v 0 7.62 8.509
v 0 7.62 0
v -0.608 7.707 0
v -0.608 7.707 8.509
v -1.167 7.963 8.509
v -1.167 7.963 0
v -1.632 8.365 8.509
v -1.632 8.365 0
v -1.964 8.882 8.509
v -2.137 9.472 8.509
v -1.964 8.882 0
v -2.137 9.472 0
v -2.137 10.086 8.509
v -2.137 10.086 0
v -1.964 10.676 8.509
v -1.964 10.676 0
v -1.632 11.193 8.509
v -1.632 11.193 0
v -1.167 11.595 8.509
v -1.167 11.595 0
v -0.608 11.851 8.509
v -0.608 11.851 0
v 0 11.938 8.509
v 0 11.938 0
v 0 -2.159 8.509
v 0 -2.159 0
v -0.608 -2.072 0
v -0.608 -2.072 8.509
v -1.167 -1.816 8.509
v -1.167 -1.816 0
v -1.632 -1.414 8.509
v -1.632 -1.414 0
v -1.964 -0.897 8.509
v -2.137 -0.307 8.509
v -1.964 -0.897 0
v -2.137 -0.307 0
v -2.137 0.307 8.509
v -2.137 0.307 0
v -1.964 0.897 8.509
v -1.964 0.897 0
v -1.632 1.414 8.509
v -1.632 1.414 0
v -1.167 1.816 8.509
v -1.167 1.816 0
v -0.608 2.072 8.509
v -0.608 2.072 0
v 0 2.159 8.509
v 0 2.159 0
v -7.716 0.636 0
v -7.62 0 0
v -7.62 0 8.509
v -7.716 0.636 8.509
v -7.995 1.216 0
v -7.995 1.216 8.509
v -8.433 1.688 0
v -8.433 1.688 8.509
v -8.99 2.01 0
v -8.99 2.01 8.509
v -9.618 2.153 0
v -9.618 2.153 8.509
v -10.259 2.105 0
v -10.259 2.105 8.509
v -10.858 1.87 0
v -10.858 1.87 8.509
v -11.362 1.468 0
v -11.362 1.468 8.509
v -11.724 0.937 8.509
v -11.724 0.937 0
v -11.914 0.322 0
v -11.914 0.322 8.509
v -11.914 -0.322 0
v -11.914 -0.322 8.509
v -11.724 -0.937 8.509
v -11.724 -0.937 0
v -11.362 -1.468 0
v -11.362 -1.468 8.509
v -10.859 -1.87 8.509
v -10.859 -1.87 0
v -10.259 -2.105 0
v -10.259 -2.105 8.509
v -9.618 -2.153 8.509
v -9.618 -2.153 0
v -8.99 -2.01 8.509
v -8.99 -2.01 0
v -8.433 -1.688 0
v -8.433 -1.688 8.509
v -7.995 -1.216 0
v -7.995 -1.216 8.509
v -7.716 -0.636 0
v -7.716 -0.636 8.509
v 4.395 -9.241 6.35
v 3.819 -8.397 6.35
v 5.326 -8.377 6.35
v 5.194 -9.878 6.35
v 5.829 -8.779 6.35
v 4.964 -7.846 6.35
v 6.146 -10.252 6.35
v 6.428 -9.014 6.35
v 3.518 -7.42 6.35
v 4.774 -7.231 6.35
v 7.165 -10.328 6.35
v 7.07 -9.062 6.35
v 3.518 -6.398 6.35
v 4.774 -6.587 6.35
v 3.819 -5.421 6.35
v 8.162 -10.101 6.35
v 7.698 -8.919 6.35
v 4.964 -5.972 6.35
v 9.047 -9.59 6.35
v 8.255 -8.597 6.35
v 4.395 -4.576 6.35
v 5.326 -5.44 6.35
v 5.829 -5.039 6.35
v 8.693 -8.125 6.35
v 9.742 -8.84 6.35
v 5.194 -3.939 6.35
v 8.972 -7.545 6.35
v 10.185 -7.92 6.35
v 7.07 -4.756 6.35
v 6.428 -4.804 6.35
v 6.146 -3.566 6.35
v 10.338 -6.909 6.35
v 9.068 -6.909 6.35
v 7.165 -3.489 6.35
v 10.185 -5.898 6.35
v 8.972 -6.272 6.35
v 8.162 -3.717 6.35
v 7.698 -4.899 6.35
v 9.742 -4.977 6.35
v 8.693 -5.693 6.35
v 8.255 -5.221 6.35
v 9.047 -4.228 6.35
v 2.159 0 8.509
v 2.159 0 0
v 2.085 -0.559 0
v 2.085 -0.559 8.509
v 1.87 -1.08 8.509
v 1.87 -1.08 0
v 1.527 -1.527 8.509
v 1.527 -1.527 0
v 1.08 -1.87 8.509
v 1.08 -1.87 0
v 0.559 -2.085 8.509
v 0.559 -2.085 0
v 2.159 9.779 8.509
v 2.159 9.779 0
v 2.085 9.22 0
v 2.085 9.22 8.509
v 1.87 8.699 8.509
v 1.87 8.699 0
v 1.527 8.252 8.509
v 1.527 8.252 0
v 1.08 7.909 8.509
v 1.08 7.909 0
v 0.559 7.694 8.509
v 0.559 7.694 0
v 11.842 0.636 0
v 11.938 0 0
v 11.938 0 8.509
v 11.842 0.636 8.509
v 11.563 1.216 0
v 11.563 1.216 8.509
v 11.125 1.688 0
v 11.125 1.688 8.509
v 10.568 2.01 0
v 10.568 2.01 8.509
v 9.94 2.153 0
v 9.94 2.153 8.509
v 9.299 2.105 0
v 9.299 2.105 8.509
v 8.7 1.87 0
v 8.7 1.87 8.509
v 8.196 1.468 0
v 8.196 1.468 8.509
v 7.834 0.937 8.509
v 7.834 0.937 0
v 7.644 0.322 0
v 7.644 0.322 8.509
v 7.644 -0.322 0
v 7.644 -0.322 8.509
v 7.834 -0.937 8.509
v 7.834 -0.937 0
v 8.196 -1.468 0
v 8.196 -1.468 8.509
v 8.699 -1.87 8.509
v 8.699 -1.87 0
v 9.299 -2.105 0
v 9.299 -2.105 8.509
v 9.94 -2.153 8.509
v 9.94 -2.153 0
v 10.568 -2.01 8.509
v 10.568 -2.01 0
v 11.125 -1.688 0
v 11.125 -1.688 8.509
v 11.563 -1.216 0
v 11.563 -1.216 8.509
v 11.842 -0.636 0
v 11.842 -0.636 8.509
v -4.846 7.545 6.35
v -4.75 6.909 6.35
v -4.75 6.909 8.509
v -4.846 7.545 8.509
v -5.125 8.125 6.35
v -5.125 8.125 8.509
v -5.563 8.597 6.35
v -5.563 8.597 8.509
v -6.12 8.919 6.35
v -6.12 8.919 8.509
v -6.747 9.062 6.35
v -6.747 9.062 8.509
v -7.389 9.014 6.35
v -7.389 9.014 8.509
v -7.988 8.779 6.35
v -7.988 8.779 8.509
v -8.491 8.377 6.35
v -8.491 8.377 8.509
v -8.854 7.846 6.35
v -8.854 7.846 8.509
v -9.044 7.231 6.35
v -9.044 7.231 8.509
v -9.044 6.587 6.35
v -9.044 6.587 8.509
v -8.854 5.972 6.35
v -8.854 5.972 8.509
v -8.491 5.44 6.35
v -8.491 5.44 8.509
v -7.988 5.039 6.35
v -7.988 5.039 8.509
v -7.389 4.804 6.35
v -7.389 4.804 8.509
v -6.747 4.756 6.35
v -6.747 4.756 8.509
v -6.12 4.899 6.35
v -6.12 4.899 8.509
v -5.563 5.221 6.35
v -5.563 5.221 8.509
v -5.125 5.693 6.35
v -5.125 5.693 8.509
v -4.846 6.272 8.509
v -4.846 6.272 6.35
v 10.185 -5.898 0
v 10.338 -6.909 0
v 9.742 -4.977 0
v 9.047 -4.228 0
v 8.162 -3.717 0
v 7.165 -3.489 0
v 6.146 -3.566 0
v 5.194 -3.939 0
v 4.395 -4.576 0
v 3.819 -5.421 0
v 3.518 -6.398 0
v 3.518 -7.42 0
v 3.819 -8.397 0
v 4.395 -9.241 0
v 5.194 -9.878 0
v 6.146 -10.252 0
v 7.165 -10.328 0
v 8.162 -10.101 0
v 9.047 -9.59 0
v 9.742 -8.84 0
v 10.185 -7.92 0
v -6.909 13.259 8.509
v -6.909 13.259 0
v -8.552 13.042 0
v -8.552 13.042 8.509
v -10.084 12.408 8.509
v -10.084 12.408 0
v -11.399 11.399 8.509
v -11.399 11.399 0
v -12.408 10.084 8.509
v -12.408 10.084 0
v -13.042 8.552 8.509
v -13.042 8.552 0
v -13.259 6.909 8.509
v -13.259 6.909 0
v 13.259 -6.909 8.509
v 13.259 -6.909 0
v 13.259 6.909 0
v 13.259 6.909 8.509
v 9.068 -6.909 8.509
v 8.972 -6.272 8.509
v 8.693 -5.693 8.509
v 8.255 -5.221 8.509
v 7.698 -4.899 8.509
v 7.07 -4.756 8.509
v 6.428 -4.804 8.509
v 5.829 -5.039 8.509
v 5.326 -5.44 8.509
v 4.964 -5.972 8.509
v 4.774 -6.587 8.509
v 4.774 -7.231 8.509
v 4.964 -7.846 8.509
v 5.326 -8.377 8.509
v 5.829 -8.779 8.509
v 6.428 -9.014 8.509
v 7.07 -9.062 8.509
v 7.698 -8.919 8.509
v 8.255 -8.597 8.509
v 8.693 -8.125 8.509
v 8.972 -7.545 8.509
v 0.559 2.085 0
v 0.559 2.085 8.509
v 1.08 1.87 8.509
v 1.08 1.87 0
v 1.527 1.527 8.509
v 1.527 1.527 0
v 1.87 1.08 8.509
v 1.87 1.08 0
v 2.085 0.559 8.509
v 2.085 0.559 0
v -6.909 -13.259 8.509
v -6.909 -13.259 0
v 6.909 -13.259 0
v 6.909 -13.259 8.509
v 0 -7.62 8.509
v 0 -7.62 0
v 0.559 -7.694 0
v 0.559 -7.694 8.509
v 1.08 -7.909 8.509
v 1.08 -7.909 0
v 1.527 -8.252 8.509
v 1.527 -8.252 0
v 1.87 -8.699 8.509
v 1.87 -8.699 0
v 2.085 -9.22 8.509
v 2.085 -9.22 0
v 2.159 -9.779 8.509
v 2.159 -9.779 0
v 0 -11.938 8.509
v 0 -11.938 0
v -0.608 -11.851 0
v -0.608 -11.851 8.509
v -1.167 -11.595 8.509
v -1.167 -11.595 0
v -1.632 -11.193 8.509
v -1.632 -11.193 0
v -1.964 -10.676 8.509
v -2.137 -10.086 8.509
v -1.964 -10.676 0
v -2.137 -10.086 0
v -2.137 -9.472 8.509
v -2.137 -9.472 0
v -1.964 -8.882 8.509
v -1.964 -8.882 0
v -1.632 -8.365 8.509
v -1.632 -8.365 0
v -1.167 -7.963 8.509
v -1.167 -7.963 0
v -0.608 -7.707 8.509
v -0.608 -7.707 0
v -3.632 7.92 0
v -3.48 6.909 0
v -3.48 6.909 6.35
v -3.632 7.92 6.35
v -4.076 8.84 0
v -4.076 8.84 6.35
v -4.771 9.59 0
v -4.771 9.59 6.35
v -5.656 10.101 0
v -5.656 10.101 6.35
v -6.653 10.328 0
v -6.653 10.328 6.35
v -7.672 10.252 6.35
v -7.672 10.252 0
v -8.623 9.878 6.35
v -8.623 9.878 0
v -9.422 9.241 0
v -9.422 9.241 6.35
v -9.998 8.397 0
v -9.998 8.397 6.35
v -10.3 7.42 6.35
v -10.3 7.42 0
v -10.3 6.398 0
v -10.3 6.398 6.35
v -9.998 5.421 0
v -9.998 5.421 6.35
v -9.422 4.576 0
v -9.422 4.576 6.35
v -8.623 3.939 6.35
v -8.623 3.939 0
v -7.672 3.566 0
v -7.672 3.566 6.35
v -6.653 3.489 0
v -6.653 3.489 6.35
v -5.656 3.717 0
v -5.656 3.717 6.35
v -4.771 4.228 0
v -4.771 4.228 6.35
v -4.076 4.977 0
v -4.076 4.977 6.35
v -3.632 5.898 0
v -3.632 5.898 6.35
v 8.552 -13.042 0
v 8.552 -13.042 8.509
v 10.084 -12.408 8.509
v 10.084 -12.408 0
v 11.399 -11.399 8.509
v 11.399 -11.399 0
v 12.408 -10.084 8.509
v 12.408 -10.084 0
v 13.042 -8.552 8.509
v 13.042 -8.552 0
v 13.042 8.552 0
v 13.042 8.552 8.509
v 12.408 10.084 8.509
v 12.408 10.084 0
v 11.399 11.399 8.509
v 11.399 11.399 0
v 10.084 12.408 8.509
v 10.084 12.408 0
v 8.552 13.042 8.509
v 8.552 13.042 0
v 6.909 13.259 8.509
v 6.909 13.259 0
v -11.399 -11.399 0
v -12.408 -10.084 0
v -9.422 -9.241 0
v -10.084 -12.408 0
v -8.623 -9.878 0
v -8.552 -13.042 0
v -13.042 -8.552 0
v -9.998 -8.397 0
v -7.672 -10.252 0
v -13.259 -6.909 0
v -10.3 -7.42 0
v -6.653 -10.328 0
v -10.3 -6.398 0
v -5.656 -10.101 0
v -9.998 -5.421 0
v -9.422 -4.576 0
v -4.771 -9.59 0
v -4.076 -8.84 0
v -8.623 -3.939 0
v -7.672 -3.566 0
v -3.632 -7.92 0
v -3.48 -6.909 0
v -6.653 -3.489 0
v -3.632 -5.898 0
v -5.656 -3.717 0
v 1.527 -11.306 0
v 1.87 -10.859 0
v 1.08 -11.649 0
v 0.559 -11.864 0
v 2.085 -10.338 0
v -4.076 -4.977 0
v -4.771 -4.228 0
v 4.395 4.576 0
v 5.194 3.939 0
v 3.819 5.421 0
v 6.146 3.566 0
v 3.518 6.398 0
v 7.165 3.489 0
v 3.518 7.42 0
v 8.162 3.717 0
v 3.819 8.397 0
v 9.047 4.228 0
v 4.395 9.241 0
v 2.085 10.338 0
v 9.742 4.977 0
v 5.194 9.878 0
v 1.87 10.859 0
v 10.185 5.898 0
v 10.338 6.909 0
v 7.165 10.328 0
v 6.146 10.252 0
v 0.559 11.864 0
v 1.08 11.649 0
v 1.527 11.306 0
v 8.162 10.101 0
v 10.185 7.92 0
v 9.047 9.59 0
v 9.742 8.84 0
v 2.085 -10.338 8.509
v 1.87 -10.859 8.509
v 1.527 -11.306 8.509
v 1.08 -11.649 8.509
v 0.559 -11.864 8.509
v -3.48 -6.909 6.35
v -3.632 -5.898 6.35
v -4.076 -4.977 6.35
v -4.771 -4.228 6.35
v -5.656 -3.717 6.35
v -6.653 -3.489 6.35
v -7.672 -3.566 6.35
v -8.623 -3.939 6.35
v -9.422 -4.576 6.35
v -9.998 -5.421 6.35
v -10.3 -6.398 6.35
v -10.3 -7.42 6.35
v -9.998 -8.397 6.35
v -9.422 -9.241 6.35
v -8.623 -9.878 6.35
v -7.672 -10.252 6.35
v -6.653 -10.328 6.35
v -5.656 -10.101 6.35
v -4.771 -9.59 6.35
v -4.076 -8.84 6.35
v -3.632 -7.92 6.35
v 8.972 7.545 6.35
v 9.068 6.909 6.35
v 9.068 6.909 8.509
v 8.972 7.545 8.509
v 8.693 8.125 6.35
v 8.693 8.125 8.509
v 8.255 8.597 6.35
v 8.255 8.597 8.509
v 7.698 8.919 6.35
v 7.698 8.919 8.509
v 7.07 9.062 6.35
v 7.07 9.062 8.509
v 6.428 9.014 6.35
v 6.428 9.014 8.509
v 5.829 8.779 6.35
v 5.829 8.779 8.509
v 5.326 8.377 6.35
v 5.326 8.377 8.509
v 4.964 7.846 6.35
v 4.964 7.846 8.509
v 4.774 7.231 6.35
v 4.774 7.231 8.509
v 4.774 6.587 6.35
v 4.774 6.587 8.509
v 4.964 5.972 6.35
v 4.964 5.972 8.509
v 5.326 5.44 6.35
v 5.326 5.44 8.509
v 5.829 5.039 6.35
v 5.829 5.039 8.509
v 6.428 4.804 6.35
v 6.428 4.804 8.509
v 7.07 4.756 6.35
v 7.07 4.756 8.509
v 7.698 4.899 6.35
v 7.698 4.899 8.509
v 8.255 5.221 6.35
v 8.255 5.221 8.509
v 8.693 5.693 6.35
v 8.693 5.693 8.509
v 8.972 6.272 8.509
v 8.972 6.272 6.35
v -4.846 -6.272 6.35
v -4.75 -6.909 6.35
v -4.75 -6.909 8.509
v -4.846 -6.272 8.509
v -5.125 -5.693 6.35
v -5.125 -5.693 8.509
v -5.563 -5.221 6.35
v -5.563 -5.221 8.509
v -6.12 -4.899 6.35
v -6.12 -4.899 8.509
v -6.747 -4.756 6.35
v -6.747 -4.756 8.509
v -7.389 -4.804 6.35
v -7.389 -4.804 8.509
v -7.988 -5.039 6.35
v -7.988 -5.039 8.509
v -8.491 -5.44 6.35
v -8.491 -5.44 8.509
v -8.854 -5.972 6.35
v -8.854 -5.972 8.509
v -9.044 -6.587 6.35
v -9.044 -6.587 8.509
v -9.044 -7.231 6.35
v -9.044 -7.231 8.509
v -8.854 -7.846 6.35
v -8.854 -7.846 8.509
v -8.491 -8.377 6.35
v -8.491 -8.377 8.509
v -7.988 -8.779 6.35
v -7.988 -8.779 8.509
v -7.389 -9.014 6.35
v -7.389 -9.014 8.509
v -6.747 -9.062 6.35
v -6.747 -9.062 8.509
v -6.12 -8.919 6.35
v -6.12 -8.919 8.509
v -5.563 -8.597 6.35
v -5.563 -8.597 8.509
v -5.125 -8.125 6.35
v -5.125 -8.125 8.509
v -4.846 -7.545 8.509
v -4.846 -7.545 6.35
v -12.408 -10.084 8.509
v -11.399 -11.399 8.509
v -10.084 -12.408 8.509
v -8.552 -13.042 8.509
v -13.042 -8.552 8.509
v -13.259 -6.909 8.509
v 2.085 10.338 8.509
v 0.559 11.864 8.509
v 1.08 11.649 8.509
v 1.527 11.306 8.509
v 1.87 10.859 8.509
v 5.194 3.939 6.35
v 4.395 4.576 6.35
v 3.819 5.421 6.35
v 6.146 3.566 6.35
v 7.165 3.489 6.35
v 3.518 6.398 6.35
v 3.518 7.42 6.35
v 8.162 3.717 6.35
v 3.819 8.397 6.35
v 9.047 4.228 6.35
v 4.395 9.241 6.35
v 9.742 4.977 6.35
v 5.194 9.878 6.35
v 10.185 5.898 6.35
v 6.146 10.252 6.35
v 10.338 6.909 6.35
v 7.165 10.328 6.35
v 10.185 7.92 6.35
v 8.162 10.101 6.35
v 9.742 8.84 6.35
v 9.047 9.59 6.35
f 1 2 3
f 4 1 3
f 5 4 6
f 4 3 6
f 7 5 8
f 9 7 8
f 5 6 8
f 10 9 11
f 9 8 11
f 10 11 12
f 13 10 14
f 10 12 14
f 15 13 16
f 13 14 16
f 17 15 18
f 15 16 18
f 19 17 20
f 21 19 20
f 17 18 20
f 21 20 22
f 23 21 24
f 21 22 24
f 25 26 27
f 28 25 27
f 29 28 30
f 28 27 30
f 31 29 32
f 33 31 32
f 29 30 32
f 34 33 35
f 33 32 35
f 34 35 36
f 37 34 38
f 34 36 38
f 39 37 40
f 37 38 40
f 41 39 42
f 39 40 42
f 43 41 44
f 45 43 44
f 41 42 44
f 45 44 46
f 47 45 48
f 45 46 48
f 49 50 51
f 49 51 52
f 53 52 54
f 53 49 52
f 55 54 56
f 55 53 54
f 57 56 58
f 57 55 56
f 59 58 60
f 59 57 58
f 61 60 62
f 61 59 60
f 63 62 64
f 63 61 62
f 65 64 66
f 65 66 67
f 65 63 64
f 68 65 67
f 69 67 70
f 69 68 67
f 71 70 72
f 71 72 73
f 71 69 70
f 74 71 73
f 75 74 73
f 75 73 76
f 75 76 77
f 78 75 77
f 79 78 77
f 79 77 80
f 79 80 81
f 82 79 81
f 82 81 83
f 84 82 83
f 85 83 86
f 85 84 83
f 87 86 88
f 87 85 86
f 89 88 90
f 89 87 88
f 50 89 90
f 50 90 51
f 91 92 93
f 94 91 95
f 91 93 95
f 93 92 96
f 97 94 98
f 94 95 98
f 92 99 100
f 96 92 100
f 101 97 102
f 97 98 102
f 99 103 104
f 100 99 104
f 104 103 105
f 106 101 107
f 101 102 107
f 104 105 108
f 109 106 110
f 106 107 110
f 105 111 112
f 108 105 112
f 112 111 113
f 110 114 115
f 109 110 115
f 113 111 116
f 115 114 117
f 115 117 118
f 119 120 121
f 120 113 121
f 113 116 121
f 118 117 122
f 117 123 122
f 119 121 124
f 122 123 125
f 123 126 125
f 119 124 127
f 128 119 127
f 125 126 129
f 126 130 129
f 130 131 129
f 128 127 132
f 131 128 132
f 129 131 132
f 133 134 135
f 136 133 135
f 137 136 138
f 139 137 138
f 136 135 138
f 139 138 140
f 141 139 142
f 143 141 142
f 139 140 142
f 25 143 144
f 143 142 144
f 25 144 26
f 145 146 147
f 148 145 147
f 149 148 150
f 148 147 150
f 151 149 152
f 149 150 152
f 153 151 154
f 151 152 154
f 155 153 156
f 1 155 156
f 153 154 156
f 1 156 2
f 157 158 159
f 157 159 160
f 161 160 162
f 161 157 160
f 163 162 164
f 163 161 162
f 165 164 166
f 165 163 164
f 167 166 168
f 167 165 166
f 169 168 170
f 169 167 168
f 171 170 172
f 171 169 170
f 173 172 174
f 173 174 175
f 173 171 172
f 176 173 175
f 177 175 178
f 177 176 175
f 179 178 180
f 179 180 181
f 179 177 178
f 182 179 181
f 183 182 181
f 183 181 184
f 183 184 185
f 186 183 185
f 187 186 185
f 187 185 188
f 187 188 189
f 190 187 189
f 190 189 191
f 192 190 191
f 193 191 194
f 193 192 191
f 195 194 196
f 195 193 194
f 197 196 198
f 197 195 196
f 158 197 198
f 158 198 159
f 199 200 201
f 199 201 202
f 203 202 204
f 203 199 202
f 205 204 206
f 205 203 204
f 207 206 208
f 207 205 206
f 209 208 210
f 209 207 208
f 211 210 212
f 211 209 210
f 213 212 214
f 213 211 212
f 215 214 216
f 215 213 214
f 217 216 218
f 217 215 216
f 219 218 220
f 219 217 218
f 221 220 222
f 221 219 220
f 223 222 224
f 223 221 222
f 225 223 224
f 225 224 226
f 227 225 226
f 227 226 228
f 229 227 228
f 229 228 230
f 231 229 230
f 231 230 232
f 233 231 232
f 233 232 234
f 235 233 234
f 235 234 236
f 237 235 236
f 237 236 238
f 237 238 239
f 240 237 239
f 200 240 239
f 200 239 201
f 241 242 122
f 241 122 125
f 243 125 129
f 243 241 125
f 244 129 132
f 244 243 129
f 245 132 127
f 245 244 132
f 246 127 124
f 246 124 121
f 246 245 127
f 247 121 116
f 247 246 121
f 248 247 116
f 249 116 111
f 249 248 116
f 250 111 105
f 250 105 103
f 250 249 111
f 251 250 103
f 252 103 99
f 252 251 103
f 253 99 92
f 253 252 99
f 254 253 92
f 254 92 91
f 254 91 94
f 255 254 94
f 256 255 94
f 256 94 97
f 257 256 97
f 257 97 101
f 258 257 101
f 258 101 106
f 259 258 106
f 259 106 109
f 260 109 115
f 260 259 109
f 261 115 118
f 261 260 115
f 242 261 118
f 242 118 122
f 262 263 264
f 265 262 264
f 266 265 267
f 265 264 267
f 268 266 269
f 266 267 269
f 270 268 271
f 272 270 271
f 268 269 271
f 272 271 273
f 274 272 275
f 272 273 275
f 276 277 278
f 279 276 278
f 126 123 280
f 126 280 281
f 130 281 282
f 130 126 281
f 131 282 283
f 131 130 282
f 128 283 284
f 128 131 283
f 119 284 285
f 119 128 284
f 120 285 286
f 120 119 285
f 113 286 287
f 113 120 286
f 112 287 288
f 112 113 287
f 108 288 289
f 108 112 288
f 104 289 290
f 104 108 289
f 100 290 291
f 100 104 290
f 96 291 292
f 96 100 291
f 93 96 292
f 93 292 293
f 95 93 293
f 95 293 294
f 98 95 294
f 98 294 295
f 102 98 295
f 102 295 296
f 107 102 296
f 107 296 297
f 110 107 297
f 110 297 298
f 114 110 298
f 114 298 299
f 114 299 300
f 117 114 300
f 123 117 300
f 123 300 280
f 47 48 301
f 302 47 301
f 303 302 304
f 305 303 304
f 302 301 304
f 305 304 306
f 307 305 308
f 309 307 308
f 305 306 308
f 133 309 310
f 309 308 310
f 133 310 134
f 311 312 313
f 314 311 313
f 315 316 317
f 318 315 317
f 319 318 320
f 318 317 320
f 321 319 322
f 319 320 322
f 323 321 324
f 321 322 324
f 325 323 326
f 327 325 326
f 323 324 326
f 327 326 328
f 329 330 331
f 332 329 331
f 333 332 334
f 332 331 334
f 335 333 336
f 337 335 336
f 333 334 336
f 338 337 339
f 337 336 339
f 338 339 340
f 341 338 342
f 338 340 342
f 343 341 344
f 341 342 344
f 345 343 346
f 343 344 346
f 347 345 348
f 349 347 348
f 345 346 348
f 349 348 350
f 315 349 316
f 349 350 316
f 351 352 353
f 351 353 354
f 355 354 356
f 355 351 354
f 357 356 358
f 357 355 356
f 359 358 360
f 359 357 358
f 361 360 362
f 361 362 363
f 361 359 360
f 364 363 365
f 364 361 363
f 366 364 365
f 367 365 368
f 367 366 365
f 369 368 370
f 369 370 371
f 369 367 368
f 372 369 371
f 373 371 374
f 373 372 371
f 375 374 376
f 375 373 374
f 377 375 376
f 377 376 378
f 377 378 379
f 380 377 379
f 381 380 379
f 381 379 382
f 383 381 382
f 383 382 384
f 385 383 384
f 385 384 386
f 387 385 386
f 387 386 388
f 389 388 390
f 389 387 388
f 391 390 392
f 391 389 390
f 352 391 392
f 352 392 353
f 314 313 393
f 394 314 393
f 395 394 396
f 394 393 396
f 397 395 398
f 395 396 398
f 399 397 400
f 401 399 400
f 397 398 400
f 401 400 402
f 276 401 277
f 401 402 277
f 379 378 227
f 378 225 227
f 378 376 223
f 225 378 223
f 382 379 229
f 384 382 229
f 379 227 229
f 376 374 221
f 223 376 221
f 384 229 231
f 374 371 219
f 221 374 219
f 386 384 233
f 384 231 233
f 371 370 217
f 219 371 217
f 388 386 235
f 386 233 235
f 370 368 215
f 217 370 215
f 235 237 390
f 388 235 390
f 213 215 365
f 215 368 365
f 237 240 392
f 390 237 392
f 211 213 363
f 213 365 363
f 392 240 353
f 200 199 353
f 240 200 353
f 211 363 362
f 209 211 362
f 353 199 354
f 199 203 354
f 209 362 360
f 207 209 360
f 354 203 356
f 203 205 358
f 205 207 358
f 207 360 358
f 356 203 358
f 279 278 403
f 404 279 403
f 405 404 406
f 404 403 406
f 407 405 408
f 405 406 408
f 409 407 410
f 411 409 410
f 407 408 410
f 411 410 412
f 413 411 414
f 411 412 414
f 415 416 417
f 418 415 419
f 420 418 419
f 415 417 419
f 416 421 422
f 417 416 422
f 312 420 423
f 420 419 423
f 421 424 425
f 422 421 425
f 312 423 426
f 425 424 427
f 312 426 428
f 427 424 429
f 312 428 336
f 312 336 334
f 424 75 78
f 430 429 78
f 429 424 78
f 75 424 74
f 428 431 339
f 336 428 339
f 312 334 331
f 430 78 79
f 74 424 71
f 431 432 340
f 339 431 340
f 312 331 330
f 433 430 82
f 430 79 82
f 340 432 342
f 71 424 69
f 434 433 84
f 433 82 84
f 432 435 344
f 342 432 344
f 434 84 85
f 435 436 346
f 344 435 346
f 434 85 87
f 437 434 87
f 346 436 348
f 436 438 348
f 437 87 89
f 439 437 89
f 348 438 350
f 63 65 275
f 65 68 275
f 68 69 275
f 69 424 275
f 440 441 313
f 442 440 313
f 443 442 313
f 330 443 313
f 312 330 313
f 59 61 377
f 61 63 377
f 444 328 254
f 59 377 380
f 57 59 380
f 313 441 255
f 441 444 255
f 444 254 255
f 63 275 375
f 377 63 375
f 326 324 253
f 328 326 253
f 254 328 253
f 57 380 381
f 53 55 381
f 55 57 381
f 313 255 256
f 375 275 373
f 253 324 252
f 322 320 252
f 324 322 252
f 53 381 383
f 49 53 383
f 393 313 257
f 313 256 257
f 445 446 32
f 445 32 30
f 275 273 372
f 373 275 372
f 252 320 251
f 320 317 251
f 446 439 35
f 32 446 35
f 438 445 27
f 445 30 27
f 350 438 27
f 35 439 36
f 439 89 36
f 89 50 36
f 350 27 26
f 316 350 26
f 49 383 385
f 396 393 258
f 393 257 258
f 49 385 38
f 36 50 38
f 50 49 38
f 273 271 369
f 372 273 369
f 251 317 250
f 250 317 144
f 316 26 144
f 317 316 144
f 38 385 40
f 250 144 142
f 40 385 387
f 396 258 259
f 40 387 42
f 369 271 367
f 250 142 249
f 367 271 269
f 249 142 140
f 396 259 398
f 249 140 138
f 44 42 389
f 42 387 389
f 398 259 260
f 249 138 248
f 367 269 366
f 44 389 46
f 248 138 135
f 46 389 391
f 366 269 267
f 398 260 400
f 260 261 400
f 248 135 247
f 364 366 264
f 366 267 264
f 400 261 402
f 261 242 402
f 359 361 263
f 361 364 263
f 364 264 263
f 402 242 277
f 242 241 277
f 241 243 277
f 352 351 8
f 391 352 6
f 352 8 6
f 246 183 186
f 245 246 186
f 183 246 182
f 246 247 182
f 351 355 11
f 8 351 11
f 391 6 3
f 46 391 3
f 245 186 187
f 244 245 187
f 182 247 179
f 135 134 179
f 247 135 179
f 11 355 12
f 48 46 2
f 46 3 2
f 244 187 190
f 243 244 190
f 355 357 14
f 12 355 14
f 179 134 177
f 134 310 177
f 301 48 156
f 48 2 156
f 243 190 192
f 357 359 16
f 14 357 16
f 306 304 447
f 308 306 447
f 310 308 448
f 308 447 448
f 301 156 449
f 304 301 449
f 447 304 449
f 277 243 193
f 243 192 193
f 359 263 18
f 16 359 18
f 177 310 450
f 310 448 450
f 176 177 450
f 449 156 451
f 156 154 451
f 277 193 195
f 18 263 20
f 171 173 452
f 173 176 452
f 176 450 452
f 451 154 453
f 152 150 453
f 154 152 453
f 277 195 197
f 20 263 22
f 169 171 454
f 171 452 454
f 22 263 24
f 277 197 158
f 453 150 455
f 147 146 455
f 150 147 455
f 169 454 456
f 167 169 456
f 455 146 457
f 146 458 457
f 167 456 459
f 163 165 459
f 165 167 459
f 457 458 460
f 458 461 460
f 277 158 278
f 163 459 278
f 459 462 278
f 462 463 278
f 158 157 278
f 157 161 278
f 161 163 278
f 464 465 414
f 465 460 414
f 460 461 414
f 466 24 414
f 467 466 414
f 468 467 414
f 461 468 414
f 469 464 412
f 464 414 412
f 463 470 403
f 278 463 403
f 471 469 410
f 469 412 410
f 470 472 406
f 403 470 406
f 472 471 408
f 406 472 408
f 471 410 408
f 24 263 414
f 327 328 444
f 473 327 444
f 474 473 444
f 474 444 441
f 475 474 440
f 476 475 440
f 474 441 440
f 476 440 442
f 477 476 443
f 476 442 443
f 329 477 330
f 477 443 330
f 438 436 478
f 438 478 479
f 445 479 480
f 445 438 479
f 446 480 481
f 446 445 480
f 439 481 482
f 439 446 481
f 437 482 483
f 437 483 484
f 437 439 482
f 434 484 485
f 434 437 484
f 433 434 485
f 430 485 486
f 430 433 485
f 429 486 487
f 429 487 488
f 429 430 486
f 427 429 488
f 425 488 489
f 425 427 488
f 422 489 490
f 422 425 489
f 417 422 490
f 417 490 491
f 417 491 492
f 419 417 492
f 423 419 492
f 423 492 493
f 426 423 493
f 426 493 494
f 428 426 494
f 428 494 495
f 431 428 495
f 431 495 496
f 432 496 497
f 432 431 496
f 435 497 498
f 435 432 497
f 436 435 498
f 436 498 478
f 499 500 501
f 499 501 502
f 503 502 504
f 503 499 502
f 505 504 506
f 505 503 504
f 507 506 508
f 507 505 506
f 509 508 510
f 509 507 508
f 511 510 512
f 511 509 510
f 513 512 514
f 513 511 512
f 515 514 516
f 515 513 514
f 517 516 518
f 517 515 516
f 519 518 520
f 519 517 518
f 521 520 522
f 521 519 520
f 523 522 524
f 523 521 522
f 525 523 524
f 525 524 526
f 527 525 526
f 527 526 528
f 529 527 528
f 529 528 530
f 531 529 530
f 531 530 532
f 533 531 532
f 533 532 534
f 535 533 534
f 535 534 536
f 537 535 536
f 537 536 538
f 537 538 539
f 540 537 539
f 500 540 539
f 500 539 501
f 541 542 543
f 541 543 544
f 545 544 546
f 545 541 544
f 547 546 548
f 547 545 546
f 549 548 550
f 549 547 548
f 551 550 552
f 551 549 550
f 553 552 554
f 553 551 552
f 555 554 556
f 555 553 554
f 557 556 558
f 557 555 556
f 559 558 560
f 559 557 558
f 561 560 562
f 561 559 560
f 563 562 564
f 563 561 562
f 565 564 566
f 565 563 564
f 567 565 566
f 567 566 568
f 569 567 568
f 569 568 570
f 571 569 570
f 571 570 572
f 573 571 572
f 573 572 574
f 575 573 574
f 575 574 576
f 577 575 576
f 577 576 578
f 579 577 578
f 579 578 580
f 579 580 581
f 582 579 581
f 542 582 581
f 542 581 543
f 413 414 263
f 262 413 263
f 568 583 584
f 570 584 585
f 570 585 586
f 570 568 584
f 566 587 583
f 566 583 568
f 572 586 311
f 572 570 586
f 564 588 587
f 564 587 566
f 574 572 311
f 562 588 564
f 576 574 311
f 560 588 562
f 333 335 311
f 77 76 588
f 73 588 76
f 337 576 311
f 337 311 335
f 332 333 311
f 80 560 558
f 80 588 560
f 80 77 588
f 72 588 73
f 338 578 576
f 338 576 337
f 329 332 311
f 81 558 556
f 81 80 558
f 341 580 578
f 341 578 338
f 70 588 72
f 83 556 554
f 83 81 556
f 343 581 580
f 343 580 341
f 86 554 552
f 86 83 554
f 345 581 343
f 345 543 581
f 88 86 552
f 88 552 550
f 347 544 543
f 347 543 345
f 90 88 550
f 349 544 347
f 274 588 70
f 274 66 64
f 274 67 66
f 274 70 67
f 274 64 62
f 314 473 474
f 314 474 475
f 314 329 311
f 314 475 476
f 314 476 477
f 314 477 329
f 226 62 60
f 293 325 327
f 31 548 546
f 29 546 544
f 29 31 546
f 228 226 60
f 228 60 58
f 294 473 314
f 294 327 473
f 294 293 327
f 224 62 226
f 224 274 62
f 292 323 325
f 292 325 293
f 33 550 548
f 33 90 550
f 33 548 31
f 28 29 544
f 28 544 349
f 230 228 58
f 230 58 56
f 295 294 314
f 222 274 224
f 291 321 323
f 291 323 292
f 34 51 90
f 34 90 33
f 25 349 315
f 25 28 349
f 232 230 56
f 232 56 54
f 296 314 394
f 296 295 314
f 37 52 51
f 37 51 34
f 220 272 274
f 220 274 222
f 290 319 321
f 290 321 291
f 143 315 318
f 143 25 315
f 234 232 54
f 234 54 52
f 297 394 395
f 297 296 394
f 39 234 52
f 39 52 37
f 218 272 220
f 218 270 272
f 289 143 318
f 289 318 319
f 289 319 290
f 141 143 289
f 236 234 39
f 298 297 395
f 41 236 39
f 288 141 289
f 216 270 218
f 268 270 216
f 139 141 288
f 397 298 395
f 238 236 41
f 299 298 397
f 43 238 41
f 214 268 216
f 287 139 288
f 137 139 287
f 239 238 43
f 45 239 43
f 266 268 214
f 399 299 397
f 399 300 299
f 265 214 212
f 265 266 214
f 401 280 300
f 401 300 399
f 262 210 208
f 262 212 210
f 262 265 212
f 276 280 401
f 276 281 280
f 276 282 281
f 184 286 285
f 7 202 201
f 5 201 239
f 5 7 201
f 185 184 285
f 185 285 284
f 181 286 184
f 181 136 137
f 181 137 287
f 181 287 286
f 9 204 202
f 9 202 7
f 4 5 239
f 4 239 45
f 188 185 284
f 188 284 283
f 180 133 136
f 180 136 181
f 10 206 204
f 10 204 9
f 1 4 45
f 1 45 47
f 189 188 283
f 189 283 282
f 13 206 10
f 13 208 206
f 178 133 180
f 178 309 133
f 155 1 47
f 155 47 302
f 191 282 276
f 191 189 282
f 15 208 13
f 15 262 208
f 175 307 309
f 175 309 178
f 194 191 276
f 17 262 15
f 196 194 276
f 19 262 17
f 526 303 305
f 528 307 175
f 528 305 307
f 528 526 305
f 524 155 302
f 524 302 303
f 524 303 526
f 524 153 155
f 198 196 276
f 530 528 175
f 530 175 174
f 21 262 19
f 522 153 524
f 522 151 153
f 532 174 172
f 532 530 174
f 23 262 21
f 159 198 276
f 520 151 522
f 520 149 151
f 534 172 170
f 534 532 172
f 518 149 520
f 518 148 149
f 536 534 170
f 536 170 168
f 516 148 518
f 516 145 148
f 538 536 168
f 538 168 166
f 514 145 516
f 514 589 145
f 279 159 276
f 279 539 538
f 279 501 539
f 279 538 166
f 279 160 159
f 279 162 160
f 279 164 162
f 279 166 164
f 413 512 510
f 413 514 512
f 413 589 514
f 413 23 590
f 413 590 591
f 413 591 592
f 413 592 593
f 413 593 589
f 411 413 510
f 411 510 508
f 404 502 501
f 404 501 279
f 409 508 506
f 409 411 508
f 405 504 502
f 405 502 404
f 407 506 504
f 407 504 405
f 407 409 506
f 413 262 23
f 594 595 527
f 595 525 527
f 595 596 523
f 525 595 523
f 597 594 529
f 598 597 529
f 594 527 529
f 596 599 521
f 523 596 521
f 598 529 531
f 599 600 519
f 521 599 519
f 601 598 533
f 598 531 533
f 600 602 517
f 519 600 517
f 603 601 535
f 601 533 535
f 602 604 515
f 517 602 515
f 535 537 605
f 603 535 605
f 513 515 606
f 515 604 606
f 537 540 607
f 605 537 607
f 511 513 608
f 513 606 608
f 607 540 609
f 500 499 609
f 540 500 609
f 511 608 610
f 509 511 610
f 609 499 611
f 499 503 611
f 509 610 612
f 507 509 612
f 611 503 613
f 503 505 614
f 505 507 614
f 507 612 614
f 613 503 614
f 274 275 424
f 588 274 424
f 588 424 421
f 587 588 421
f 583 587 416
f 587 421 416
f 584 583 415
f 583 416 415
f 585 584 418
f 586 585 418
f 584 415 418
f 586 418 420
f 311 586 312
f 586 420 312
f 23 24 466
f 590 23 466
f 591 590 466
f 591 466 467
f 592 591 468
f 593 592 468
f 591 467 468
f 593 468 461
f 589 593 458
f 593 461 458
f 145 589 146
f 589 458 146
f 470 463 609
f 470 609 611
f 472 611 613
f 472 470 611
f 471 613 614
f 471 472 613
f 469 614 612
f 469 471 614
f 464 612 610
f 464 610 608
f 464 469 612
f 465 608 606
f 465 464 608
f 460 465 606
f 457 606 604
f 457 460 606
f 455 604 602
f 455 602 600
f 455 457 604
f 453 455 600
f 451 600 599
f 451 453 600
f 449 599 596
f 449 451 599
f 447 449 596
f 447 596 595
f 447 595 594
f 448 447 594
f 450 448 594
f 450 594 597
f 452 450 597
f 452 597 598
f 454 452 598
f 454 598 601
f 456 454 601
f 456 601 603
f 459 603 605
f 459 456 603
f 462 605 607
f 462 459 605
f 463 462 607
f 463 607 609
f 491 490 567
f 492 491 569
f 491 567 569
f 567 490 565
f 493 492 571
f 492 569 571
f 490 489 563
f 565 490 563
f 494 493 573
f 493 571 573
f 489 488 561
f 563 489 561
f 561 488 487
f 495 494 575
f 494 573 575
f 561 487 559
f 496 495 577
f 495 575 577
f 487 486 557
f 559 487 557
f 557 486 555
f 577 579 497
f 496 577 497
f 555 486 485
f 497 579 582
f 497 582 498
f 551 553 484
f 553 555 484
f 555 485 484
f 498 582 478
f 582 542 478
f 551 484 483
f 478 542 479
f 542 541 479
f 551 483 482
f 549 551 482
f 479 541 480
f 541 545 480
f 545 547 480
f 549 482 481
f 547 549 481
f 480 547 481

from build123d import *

# Parameters (mm, degrees)
F0_R     = 3.429
F0_R_2   = 2.159
F1_DEPTH = 8.509
F2_DEPTH = 6.35


with BuildPart() as f1:
    # F0 (on Top) → F1 (new body)
    with BuildSketch(Plane.XY):
        with BuildLine():
            Line((0, 11.938), (0, 13.2588))
            Line((0, 13.2588), (-6.9088, 13.2588))
            ThreePointArc((-6.9088, 13.2588), (-11.398928, 11.398928), (-13.2588, 6.9088))
            Line((-13.2588, 6.9088), (-13.2588, -6.9088))
            ThreePointArc((-13.2588, -6.9088), (-11.398928, -11.398928), (-6.9088, -13.2588))
            Line((-6.9088, -13.2588), (0, -13.2588))
            Line((0, -13.2588), (0, -11.938))
            ThreePointArc((0, -11.938), (-2.159, -9.779), (0, -7.62))
            Line((0, -7.62), (0, -2.159))
            ThreePointArc((0, -2.159), (-2.159, 0), (0, 2.159))
            Line((0, 2.159), (0, 7.62))
            ThreePointArc((0, 7.62), (-2.159, 9.779), (0, 11.938))
        make_face()
        with Locations((-6.9088, -6.9088)):
            Circle(F0_R, mode=Mode.SUBTRACT)
        with Locations((-9.779, 0)):
            Circle(F0_R_2, mode=Mode.SUBTRACT)
        with Locations((-6.9088, 6.9088)):
            Circle(F0_R, mode=Mode.SUBTRACT)
        with BuildLine():
            ThreePointArc((13.2588, 6.9088), (11.398928, 11.398928), (6.9088, 13.2588))
            Line((6.9088, 13.2588), (0, 13.2588))
            Line((0, 13.2588), (0, 11.938))
            ThreePointArc((0, 11.938), (1.526644, 11.305644), (2.159, 9.779))
            ThreePointArc((2.159, 9.779), (1.526644, 8.252356), (0, 7.62))
            Line((0, 7.62), (0, 2.159))
            ThreePointArc((0, 2.159), (1.526644, 1.526644), (2.159, 0))
            ThreePointArc((2.159, 0), (1.526644, -1.526644), (0, -2.159))
            Line((0, -2.159), (0, -7.62))
            ThreePointArc((0, -7.62), (1.526644, -8.252356), (2.159, -9.779))
            ThreePointArc((2.159, -9.779), (1.526644, -11.305644), (0, -11.938))
            Line((0, -11.938), (0, -13.2588))
            Line((0, -13.2588), (6.9088, -13.2588))
            ThreePointArc((6.9088, -13.2588), (11.398928, -11.398928), (13.2588, -6.9088))
            Line((13.2588, -6.9088), (13.2588, 6.9088))
        make_face()
        with Locations((6.9088, -6.9088)):
            Circle(F0_R, mode=Mode.SUBTRACT)
        with Locations((9.779, 0)):
            Circle(F0_R_2, mode=Mode.SUBTRACT)
        with Locations((6.9088, 6.9088)):
            Circle(F0_R, mode=Mode.SUBTRACT)
        with Locations((-6.9088, 6.9088)):
            Circle(F0_R)
        with Locations((-6.9088, 6.9088)):
            Circle(F0_R_2, mode=Mode.SUBTRACT)
        with Locations((-6.9088, -6.9088)):
            Circle(F0_R)
        with Locations((-6.9088, -6.9088)):
            Circle(F0_R_2, mode=Mode.SUBTRACT)
        with Locations((6.9088, -6.9088)):
            Circle(F0_R)
        with Locations((6.9088, -6.9088)):
            Circle(F0_R_2, mode=Mode.SUBTRACT)
        with Locations((6.9088, 6.9088)):
            Circle(F0_R)
        with Locations((6.9088, 6.9088)):
            Circle(F0_R_2, mode=Mode.SUBTRACT)
    extrude(amount=F1_DEPTH)

    # F0 (on Top) → F2 (cut)
    with BuildSketch(Plane.XY):
        with Locations((-6.9088, -6.9088)):
            Circle(F0_R)
        with Locations((-6.9088, -6.9088)):
            Circle(F0_R_2, mode=Mode.SUBTRACT)
        with Locations((6.9088, -6.9088)):
            Circle(F0_R)
        with Locations((6.9088, -6.9088)):
            Circle(F0_R_2, mode=Mode.SUBTRACT)
        with Locations((6.9088, 6.9088)):
            Circle(F0_R)
        with Locations((6.9088, 6.9088)):
            Circle(F0_R_2, mode=Mode.SUBTRACT)
        with Locations((-6.9088, 6.9088)):
            Circle(F0_R)
        with Locations((-6.9088, 6.9088)):
            Circle(F0_R_2, mode=Mode.SUBTRACT)
    extrude(amount=F2_DEPTH, mode=Mode.SUBTRACT)


solid = f1.part
